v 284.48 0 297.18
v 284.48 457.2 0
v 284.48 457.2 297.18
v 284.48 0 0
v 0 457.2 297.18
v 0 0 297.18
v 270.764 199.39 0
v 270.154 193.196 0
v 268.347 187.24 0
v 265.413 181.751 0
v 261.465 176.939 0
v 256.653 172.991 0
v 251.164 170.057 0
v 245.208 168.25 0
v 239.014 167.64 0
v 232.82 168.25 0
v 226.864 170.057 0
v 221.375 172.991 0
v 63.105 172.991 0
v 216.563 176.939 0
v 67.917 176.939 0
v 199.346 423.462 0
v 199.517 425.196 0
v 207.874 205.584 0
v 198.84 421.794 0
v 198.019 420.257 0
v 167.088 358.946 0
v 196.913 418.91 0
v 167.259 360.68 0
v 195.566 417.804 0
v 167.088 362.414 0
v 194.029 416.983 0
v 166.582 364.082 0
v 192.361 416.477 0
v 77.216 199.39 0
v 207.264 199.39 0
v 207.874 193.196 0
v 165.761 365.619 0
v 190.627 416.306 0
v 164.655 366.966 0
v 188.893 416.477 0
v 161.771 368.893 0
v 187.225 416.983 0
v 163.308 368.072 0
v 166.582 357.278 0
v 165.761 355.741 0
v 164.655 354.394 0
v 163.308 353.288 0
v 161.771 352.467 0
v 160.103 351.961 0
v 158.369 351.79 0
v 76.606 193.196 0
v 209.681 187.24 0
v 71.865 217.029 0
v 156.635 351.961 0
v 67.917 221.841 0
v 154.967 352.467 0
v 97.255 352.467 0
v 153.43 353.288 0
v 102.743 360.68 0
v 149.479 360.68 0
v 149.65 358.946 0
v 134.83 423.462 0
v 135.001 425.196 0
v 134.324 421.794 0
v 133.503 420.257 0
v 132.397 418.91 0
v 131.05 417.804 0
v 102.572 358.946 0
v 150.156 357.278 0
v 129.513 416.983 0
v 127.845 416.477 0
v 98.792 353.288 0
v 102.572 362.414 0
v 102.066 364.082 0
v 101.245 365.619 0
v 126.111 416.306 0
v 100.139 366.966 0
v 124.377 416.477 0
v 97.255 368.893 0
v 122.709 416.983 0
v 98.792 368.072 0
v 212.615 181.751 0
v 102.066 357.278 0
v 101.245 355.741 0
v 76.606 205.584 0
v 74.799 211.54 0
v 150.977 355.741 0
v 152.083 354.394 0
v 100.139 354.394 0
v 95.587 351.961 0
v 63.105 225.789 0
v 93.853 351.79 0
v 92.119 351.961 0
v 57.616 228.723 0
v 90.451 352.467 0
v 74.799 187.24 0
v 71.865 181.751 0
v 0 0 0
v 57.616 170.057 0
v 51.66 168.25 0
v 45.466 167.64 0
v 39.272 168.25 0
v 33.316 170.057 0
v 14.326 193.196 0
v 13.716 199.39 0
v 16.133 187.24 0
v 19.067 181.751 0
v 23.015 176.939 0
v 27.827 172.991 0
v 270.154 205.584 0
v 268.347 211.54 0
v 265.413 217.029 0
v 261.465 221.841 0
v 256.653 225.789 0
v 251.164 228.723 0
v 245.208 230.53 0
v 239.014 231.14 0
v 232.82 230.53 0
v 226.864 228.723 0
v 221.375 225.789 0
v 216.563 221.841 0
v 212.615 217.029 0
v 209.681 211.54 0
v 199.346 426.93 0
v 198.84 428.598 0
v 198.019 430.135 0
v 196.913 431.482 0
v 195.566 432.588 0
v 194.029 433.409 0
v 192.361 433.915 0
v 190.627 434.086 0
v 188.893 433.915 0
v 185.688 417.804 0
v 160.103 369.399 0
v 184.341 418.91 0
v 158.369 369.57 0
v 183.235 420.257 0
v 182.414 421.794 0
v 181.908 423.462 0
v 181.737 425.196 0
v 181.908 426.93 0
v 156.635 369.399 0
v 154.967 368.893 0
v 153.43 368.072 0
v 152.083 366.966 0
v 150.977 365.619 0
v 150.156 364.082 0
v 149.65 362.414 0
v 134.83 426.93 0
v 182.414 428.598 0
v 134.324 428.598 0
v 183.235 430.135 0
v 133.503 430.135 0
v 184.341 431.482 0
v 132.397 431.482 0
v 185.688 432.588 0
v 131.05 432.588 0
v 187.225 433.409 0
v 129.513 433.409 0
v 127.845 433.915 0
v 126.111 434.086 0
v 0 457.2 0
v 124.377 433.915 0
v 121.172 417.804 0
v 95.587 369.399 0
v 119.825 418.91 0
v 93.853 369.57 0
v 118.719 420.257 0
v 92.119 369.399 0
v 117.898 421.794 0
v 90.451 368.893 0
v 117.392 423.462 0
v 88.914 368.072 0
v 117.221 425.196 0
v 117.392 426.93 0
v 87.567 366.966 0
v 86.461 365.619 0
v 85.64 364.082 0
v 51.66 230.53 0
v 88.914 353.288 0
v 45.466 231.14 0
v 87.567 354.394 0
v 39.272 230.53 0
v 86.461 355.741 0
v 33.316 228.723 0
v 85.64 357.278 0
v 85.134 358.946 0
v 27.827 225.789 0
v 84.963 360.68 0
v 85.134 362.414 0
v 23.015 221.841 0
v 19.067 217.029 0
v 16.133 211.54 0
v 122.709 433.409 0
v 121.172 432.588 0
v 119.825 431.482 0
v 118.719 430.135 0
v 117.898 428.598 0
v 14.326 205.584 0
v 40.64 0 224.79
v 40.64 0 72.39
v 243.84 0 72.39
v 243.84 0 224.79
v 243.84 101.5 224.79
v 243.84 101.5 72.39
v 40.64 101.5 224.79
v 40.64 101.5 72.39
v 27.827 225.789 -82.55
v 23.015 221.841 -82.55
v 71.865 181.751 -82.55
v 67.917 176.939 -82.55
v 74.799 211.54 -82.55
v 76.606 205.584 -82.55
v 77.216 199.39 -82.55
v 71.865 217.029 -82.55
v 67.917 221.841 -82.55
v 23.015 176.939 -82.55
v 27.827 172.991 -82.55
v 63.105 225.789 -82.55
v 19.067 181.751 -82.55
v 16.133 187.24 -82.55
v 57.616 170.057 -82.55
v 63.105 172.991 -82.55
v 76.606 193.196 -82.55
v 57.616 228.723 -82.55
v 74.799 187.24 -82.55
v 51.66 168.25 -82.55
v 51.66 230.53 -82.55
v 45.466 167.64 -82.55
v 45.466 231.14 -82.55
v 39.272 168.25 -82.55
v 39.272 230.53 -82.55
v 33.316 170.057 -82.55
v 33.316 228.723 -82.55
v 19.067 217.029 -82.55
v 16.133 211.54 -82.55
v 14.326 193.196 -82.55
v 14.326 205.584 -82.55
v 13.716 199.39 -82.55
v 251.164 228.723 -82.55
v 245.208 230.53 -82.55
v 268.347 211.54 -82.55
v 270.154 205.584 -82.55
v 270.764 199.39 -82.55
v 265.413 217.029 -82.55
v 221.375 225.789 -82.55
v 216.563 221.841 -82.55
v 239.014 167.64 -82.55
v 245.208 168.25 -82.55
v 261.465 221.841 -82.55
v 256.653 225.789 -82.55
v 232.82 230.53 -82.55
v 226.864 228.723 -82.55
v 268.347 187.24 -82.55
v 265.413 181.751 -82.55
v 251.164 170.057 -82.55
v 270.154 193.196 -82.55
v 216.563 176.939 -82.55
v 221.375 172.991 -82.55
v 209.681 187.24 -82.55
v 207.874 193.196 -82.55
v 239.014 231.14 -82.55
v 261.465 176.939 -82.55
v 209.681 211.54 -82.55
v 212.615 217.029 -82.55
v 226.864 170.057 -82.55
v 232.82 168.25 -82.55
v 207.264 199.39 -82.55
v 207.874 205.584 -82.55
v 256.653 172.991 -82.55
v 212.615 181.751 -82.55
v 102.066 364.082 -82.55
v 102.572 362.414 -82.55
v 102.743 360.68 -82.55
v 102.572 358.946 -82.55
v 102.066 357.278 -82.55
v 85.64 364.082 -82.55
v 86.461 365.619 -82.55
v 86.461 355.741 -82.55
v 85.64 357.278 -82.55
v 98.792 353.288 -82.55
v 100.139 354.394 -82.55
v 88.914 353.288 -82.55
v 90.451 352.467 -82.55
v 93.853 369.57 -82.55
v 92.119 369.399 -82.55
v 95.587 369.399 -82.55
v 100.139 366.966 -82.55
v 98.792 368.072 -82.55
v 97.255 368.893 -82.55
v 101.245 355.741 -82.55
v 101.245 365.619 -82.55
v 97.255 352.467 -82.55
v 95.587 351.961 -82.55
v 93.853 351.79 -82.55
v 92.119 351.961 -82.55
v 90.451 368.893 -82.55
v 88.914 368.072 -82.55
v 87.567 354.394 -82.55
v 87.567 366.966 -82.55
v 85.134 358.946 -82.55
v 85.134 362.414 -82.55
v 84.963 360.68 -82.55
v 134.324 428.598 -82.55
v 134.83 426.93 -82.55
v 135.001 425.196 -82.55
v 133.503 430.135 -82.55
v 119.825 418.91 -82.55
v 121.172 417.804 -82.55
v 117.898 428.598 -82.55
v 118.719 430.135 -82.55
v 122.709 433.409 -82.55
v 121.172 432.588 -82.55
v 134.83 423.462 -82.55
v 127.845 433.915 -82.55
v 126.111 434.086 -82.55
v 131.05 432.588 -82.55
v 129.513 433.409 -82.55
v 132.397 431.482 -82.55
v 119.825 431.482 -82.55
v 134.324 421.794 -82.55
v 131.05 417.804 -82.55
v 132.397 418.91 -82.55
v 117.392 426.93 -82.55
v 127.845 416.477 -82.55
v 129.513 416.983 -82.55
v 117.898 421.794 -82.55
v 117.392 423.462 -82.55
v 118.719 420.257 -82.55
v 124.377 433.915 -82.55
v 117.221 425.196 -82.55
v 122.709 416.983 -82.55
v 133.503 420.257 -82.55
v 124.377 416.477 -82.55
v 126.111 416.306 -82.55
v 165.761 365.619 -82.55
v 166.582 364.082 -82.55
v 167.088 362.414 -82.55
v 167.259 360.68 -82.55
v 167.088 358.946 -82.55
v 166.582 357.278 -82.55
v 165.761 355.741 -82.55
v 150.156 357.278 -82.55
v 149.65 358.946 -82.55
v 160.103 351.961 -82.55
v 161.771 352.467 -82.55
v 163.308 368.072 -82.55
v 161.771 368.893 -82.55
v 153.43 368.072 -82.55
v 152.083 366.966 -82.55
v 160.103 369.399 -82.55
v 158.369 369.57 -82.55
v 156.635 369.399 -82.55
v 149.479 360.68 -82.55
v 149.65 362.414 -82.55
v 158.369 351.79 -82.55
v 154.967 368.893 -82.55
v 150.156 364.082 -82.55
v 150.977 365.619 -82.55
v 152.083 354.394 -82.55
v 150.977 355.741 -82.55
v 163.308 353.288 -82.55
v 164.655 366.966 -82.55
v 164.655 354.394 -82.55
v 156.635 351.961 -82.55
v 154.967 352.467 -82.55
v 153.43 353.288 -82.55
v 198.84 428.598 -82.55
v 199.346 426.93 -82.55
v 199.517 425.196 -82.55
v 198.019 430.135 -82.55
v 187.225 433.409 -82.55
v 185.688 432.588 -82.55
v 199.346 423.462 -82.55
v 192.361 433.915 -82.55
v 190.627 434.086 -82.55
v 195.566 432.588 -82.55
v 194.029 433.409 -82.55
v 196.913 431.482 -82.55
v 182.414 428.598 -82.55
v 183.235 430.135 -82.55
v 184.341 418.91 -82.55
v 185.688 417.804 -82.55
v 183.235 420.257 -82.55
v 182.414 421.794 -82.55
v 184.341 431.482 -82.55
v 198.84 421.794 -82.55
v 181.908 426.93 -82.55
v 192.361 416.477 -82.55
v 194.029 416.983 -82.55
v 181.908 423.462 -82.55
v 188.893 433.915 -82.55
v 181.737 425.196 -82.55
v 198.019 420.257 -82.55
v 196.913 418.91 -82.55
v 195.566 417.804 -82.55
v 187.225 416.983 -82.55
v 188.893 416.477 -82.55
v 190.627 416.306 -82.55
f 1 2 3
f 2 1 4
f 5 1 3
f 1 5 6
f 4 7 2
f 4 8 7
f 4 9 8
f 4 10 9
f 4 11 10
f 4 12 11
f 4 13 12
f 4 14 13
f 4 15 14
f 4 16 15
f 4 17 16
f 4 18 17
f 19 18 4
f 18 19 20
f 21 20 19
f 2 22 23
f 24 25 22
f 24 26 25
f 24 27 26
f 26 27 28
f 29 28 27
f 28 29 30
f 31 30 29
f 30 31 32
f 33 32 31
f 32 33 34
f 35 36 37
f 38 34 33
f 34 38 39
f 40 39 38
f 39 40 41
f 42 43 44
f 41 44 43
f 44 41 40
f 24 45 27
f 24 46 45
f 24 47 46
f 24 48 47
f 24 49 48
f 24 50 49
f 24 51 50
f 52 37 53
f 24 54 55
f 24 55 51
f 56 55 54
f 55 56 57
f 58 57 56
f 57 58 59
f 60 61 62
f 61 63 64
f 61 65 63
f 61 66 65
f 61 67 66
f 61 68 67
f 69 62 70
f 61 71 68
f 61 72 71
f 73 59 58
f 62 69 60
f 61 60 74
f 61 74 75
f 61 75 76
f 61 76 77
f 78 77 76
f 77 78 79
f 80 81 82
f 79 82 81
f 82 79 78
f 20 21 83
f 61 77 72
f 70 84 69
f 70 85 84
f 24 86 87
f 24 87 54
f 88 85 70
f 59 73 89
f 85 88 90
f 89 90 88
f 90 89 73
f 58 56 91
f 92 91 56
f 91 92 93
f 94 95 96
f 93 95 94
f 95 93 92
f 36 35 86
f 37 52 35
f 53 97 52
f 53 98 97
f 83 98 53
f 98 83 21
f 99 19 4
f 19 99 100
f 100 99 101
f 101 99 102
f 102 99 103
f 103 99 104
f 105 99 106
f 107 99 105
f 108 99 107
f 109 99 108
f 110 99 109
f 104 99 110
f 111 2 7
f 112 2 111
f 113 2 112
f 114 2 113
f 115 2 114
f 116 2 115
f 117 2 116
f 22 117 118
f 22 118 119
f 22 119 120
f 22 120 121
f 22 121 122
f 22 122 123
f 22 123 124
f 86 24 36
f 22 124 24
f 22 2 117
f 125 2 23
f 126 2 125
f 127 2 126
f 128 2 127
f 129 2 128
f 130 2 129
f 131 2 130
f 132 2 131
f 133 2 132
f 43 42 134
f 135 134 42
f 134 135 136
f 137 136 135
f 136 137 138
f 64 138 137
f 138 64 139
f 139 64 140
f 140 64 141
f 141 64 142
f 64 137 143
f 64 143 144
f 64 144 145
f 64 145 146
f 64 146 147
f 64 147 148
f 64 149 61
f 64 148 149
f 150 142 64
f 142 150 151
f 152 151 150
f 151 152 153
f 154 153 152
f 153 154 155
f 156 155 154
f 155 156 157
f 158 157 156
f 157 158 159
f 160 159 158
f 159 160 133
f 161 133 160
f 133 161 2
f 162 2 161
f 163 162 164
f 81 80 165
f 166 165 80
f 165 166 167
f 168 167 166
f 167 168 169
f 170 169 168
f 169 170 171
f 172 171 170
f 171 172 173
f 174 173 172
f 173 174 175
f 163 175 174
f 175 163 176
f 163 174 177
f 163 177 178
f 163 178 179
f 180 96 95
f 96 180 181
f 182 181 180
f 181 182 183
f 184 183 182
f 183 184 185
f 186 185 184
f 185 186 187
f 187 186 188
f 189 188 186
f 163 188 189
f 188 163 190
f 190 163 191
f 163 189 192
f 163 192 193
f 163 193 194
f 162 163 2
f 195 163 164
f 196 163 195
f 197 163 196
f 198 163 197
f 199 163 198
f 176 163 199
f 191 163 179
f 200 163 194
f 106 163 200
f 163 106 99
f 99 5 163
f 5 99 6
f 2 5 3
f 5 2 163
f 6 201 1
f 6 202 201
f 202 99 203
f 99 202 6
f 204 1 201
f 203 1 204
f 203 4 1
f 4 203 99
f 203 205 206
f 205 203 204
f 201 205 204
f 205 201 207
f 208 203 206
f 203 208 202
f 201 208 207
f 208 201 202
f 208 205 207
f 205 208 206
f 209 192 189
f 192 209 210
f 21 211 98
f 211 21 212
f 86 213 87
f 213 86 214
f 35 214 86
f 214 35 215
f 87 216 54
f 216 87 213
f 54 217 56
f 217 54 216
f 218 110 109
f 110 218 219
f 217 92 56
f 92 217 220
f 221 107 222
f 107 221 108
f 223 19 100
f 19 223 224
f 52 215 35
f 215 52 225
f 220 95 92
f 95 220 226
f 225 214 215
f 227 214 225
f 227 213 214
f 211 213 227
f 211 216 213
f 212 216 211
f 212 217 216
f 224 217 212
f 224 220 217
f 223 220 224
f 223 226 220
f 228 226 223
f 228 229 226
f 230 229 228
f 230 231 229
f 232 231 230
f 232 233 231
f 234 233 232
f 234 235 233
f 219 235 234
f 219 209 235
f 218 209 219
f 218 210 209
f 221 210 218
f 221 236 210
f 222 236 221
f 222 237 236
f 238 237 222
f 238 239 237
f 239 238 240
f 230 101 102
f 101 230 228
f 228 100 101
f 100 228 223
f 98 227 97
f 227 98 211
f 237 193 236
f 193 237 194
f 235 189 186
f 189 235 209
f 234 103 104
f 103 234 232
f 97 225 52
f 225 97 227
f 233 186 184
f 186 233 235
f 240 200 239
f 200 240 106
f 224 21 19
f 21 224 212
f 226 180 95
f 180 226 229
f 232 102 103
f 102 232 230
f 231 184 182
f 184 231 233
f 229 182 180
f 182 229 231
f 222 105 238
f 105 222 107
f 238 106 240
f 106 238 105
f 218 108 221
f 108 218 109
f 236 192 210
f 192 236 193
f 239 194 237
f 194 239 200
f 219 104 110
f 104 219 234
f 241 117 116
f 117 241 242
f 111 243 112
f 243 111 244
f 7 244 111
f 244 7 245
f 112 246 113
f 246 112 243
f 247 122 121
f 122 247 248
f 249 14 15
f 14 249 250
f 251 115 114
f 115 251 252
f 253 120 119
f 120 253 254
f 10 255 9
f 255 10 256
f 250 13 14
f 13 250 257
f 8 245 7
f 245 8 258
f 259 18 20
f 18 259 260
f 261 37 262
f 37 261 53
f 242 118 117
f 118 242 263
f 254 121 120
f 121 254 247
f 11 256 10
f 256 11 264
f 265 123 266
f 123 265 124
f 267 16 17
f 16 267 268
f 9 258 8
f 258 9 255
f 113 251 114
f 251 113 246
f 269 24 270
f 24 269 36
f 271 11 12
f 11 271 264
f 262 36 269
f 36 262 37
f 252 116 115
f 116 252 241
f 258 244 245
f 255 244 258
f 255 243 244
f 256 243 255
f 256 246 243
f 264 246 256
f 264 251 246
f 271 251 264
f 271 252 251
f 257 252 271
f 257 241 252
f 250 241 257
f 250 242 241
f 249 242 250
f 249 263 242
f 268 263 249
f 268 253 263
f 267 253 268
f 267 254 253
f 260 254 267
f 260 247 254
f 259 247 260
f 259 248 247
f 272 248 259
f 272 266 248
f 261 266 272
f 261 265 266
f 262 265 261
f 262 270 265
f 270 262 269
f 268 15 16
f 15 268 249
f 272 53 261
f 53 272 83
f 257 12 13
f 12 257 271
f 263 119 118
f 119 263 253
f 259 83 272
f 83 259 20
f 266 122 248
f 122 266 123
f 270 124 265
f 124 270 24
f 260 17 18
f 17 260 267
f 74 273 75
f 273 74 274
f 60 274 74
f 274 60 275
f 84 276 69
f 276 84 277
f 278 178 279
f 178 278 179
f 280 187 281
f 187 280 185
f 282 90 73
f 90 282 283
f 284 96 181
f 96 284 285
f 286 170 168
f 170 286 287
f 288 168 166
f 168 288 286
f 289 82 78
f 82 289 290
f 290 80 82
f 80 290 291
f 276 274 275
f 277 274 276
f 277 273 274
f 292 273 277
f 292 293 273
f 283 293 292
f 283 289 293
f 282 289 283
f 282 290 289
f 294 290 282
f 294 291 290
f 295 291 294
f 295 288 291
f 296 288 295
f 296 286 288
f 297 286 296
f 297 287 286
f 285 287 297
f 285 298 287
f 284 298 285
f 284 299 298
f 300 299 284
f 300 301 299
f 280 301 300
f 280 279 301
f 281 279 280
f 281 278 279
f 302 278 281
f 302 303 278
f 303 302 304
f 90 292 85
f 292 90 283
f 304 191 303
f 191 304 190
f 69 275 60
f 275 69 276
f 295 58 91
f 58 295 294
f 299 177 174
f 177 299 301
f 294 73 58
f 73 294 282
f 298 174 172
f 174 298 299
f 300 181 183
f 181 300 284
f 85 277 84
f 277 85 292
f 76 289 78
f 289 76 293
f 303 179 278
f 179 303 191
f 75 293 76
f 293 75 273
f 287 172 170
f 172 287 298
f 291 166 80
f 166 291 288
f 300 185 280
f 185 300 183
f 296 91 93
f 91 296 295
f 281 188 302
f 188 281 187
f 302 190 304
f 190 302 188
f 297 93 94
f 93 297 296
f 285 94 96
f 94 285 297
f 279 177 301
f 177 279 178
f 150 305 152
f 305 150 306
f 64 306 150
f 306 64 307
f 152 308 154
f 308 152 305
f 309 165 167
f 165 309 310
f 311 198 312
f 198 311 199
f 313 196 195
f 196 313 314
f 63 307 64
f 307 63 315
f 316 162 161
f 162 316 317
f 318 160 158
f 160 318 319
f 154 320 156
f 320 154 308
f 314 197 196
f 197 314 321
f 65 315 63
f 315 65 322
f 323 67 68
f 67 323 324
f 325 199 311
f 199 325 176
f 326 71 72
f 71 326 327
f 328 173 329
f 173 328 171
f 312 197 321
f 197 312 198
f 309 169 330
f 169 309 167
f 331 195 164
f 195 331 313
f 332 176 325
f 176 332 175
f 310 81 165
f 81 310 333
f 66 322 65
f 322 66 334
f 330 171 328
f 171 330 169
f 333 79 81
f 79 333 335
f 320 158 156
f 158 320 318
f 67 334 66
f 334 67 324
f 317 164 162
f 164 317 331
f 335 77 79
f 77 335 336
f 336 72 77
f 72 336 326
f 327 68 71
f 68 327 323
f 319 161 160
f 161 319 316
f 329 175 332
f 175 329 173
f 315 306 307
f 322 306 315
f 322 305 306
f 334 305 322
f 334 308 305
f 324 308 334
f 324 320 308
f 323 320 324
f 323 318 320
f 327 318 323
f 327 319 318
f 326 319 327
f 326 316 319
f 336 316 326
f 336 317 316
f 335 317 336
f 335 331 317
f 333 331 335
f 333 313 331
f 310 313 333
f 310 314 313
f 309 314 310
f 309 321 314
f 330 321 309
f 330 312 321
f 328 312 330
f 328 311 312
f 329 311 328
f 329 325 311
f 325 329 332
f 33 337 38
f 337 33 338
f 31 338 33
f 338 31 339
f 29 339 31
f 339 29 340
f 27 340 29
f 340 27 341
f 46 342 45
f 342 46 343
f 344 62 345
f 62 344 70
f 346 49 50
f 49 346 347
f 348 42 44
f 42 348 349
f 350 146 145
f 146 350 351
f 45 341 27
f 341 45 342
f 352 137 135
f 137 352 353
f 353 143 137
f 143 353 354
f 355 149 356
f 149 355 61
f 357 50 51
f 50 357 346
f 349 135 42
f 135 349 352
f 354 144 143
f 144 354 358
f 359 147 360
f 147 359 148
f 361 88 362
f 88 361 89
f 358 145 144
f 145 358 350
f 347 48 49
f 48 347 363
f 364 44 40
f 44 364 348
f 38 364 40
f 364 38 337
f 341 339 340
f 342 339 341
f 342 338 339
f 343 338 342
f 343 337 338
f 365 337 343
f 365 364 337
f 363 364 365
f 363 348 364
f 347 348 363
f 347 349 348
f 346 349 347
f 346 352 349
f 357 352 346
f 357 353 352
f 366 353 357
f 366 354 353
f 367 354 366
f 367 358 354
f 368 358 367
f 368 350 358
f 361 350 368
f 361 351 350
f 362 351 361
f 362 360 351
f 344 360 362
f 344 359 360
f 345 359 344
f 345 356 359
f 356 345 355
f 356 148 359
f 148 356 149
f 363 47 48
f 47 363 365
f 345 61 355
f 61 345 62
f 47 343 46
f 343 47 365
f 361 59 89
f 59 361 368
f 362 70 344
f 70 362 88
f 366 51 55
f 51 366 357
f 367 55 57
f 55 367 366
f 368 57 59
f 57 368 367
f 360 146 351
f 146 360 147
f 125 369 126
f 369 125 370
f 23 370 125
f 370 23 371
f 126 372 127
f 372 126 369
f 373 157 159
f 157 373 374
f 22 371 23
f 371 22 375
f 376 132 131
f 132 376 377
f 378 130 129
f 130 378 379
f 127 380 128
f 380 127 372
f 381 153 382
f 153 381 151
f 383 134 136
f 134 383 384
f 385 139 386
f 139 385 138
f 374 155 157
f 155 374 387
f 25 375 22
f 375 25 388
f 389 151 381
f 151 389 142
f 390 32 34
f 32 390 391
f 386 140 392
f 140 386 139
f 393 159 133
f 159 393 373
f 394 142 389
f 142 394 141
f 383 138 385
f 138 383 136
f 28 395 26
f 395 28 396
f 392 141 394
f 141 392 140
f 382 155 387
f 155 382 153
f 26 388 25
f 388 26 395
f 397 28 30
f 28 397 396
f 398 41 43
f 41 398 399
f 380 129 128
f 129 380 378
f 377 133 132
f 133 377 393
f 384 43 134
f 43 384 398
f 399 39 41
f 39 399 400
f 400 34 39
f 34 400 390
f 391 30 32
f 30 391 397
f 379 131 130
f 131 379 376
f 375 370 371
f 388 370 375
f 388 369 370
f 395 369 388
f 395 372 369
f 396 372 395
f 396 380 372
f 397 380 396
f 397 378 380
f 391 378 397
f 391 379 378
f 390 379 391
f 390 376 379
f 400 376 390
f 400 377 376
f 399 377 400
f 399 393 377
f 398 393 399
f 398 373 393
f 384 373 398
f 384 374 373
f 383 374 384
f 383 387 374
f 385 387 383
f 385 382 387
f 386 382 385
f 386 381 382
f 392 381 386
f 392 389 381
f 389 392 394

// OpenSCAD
//
// Assman 4 pin RJ connector
// A-2004-3-4-LP-N
//

e = 0.1;
function mm(x)=x*25.4;
$fn=32;

pin_dia = mm(0.7);
pin_len = mm(3.25);

peg_dia = mm(2.5);
peg_len = mm(3.25);

body_wid = mm(11.2);
body_len = mm(18);
body_hgt = mm(11.7);

pin_dx = mm(1.27);
pin_dy = mm(2.54);

peg_dx = mm(7.62);

pin_x0 = (body_wid-3*pin_dx)/2;
pin_y0 = mm(14.2);

module pin_at(x,y) {
  translate( [x, y, -pin_len])
    cylinder(h=pin_len, d=pin_dia);
}

module peg_at(x,y) {
  translate( [x, y, -peg_len])
    cylinder(h=peg_len, d=peg_dia);
}

cut_wid = mm(8);
cut_hgt = mm(6);
cut_len = mm(4);

module body() {
  difference() {
    cube( [body_wid, body_len, body_hgt]);
    translate( [(body_wid-cut_wid)/2, -e, (body_hgt-cut_hgt)/2])
      cube( [cut_wid, cut_len, cut_hgt]);
  }
}


module rj() {
  body();
  peg_at( (body_wid-peg_dx)/2, mm(7.85));
  peg_at( (body_wid-peg_dx)/2+peg_dx, mm(7.85));
  pin_at( pin_x0, pin_y0);
  pin_at( pin_x0+pin_dx, pin_y0+pin_dy);
  pin_at( pin_x0+2*pin_dx, pin_y0);
  pin_at( pin_x0+3*pin_dx, pin_y0+pin_dy);
}


rj();
